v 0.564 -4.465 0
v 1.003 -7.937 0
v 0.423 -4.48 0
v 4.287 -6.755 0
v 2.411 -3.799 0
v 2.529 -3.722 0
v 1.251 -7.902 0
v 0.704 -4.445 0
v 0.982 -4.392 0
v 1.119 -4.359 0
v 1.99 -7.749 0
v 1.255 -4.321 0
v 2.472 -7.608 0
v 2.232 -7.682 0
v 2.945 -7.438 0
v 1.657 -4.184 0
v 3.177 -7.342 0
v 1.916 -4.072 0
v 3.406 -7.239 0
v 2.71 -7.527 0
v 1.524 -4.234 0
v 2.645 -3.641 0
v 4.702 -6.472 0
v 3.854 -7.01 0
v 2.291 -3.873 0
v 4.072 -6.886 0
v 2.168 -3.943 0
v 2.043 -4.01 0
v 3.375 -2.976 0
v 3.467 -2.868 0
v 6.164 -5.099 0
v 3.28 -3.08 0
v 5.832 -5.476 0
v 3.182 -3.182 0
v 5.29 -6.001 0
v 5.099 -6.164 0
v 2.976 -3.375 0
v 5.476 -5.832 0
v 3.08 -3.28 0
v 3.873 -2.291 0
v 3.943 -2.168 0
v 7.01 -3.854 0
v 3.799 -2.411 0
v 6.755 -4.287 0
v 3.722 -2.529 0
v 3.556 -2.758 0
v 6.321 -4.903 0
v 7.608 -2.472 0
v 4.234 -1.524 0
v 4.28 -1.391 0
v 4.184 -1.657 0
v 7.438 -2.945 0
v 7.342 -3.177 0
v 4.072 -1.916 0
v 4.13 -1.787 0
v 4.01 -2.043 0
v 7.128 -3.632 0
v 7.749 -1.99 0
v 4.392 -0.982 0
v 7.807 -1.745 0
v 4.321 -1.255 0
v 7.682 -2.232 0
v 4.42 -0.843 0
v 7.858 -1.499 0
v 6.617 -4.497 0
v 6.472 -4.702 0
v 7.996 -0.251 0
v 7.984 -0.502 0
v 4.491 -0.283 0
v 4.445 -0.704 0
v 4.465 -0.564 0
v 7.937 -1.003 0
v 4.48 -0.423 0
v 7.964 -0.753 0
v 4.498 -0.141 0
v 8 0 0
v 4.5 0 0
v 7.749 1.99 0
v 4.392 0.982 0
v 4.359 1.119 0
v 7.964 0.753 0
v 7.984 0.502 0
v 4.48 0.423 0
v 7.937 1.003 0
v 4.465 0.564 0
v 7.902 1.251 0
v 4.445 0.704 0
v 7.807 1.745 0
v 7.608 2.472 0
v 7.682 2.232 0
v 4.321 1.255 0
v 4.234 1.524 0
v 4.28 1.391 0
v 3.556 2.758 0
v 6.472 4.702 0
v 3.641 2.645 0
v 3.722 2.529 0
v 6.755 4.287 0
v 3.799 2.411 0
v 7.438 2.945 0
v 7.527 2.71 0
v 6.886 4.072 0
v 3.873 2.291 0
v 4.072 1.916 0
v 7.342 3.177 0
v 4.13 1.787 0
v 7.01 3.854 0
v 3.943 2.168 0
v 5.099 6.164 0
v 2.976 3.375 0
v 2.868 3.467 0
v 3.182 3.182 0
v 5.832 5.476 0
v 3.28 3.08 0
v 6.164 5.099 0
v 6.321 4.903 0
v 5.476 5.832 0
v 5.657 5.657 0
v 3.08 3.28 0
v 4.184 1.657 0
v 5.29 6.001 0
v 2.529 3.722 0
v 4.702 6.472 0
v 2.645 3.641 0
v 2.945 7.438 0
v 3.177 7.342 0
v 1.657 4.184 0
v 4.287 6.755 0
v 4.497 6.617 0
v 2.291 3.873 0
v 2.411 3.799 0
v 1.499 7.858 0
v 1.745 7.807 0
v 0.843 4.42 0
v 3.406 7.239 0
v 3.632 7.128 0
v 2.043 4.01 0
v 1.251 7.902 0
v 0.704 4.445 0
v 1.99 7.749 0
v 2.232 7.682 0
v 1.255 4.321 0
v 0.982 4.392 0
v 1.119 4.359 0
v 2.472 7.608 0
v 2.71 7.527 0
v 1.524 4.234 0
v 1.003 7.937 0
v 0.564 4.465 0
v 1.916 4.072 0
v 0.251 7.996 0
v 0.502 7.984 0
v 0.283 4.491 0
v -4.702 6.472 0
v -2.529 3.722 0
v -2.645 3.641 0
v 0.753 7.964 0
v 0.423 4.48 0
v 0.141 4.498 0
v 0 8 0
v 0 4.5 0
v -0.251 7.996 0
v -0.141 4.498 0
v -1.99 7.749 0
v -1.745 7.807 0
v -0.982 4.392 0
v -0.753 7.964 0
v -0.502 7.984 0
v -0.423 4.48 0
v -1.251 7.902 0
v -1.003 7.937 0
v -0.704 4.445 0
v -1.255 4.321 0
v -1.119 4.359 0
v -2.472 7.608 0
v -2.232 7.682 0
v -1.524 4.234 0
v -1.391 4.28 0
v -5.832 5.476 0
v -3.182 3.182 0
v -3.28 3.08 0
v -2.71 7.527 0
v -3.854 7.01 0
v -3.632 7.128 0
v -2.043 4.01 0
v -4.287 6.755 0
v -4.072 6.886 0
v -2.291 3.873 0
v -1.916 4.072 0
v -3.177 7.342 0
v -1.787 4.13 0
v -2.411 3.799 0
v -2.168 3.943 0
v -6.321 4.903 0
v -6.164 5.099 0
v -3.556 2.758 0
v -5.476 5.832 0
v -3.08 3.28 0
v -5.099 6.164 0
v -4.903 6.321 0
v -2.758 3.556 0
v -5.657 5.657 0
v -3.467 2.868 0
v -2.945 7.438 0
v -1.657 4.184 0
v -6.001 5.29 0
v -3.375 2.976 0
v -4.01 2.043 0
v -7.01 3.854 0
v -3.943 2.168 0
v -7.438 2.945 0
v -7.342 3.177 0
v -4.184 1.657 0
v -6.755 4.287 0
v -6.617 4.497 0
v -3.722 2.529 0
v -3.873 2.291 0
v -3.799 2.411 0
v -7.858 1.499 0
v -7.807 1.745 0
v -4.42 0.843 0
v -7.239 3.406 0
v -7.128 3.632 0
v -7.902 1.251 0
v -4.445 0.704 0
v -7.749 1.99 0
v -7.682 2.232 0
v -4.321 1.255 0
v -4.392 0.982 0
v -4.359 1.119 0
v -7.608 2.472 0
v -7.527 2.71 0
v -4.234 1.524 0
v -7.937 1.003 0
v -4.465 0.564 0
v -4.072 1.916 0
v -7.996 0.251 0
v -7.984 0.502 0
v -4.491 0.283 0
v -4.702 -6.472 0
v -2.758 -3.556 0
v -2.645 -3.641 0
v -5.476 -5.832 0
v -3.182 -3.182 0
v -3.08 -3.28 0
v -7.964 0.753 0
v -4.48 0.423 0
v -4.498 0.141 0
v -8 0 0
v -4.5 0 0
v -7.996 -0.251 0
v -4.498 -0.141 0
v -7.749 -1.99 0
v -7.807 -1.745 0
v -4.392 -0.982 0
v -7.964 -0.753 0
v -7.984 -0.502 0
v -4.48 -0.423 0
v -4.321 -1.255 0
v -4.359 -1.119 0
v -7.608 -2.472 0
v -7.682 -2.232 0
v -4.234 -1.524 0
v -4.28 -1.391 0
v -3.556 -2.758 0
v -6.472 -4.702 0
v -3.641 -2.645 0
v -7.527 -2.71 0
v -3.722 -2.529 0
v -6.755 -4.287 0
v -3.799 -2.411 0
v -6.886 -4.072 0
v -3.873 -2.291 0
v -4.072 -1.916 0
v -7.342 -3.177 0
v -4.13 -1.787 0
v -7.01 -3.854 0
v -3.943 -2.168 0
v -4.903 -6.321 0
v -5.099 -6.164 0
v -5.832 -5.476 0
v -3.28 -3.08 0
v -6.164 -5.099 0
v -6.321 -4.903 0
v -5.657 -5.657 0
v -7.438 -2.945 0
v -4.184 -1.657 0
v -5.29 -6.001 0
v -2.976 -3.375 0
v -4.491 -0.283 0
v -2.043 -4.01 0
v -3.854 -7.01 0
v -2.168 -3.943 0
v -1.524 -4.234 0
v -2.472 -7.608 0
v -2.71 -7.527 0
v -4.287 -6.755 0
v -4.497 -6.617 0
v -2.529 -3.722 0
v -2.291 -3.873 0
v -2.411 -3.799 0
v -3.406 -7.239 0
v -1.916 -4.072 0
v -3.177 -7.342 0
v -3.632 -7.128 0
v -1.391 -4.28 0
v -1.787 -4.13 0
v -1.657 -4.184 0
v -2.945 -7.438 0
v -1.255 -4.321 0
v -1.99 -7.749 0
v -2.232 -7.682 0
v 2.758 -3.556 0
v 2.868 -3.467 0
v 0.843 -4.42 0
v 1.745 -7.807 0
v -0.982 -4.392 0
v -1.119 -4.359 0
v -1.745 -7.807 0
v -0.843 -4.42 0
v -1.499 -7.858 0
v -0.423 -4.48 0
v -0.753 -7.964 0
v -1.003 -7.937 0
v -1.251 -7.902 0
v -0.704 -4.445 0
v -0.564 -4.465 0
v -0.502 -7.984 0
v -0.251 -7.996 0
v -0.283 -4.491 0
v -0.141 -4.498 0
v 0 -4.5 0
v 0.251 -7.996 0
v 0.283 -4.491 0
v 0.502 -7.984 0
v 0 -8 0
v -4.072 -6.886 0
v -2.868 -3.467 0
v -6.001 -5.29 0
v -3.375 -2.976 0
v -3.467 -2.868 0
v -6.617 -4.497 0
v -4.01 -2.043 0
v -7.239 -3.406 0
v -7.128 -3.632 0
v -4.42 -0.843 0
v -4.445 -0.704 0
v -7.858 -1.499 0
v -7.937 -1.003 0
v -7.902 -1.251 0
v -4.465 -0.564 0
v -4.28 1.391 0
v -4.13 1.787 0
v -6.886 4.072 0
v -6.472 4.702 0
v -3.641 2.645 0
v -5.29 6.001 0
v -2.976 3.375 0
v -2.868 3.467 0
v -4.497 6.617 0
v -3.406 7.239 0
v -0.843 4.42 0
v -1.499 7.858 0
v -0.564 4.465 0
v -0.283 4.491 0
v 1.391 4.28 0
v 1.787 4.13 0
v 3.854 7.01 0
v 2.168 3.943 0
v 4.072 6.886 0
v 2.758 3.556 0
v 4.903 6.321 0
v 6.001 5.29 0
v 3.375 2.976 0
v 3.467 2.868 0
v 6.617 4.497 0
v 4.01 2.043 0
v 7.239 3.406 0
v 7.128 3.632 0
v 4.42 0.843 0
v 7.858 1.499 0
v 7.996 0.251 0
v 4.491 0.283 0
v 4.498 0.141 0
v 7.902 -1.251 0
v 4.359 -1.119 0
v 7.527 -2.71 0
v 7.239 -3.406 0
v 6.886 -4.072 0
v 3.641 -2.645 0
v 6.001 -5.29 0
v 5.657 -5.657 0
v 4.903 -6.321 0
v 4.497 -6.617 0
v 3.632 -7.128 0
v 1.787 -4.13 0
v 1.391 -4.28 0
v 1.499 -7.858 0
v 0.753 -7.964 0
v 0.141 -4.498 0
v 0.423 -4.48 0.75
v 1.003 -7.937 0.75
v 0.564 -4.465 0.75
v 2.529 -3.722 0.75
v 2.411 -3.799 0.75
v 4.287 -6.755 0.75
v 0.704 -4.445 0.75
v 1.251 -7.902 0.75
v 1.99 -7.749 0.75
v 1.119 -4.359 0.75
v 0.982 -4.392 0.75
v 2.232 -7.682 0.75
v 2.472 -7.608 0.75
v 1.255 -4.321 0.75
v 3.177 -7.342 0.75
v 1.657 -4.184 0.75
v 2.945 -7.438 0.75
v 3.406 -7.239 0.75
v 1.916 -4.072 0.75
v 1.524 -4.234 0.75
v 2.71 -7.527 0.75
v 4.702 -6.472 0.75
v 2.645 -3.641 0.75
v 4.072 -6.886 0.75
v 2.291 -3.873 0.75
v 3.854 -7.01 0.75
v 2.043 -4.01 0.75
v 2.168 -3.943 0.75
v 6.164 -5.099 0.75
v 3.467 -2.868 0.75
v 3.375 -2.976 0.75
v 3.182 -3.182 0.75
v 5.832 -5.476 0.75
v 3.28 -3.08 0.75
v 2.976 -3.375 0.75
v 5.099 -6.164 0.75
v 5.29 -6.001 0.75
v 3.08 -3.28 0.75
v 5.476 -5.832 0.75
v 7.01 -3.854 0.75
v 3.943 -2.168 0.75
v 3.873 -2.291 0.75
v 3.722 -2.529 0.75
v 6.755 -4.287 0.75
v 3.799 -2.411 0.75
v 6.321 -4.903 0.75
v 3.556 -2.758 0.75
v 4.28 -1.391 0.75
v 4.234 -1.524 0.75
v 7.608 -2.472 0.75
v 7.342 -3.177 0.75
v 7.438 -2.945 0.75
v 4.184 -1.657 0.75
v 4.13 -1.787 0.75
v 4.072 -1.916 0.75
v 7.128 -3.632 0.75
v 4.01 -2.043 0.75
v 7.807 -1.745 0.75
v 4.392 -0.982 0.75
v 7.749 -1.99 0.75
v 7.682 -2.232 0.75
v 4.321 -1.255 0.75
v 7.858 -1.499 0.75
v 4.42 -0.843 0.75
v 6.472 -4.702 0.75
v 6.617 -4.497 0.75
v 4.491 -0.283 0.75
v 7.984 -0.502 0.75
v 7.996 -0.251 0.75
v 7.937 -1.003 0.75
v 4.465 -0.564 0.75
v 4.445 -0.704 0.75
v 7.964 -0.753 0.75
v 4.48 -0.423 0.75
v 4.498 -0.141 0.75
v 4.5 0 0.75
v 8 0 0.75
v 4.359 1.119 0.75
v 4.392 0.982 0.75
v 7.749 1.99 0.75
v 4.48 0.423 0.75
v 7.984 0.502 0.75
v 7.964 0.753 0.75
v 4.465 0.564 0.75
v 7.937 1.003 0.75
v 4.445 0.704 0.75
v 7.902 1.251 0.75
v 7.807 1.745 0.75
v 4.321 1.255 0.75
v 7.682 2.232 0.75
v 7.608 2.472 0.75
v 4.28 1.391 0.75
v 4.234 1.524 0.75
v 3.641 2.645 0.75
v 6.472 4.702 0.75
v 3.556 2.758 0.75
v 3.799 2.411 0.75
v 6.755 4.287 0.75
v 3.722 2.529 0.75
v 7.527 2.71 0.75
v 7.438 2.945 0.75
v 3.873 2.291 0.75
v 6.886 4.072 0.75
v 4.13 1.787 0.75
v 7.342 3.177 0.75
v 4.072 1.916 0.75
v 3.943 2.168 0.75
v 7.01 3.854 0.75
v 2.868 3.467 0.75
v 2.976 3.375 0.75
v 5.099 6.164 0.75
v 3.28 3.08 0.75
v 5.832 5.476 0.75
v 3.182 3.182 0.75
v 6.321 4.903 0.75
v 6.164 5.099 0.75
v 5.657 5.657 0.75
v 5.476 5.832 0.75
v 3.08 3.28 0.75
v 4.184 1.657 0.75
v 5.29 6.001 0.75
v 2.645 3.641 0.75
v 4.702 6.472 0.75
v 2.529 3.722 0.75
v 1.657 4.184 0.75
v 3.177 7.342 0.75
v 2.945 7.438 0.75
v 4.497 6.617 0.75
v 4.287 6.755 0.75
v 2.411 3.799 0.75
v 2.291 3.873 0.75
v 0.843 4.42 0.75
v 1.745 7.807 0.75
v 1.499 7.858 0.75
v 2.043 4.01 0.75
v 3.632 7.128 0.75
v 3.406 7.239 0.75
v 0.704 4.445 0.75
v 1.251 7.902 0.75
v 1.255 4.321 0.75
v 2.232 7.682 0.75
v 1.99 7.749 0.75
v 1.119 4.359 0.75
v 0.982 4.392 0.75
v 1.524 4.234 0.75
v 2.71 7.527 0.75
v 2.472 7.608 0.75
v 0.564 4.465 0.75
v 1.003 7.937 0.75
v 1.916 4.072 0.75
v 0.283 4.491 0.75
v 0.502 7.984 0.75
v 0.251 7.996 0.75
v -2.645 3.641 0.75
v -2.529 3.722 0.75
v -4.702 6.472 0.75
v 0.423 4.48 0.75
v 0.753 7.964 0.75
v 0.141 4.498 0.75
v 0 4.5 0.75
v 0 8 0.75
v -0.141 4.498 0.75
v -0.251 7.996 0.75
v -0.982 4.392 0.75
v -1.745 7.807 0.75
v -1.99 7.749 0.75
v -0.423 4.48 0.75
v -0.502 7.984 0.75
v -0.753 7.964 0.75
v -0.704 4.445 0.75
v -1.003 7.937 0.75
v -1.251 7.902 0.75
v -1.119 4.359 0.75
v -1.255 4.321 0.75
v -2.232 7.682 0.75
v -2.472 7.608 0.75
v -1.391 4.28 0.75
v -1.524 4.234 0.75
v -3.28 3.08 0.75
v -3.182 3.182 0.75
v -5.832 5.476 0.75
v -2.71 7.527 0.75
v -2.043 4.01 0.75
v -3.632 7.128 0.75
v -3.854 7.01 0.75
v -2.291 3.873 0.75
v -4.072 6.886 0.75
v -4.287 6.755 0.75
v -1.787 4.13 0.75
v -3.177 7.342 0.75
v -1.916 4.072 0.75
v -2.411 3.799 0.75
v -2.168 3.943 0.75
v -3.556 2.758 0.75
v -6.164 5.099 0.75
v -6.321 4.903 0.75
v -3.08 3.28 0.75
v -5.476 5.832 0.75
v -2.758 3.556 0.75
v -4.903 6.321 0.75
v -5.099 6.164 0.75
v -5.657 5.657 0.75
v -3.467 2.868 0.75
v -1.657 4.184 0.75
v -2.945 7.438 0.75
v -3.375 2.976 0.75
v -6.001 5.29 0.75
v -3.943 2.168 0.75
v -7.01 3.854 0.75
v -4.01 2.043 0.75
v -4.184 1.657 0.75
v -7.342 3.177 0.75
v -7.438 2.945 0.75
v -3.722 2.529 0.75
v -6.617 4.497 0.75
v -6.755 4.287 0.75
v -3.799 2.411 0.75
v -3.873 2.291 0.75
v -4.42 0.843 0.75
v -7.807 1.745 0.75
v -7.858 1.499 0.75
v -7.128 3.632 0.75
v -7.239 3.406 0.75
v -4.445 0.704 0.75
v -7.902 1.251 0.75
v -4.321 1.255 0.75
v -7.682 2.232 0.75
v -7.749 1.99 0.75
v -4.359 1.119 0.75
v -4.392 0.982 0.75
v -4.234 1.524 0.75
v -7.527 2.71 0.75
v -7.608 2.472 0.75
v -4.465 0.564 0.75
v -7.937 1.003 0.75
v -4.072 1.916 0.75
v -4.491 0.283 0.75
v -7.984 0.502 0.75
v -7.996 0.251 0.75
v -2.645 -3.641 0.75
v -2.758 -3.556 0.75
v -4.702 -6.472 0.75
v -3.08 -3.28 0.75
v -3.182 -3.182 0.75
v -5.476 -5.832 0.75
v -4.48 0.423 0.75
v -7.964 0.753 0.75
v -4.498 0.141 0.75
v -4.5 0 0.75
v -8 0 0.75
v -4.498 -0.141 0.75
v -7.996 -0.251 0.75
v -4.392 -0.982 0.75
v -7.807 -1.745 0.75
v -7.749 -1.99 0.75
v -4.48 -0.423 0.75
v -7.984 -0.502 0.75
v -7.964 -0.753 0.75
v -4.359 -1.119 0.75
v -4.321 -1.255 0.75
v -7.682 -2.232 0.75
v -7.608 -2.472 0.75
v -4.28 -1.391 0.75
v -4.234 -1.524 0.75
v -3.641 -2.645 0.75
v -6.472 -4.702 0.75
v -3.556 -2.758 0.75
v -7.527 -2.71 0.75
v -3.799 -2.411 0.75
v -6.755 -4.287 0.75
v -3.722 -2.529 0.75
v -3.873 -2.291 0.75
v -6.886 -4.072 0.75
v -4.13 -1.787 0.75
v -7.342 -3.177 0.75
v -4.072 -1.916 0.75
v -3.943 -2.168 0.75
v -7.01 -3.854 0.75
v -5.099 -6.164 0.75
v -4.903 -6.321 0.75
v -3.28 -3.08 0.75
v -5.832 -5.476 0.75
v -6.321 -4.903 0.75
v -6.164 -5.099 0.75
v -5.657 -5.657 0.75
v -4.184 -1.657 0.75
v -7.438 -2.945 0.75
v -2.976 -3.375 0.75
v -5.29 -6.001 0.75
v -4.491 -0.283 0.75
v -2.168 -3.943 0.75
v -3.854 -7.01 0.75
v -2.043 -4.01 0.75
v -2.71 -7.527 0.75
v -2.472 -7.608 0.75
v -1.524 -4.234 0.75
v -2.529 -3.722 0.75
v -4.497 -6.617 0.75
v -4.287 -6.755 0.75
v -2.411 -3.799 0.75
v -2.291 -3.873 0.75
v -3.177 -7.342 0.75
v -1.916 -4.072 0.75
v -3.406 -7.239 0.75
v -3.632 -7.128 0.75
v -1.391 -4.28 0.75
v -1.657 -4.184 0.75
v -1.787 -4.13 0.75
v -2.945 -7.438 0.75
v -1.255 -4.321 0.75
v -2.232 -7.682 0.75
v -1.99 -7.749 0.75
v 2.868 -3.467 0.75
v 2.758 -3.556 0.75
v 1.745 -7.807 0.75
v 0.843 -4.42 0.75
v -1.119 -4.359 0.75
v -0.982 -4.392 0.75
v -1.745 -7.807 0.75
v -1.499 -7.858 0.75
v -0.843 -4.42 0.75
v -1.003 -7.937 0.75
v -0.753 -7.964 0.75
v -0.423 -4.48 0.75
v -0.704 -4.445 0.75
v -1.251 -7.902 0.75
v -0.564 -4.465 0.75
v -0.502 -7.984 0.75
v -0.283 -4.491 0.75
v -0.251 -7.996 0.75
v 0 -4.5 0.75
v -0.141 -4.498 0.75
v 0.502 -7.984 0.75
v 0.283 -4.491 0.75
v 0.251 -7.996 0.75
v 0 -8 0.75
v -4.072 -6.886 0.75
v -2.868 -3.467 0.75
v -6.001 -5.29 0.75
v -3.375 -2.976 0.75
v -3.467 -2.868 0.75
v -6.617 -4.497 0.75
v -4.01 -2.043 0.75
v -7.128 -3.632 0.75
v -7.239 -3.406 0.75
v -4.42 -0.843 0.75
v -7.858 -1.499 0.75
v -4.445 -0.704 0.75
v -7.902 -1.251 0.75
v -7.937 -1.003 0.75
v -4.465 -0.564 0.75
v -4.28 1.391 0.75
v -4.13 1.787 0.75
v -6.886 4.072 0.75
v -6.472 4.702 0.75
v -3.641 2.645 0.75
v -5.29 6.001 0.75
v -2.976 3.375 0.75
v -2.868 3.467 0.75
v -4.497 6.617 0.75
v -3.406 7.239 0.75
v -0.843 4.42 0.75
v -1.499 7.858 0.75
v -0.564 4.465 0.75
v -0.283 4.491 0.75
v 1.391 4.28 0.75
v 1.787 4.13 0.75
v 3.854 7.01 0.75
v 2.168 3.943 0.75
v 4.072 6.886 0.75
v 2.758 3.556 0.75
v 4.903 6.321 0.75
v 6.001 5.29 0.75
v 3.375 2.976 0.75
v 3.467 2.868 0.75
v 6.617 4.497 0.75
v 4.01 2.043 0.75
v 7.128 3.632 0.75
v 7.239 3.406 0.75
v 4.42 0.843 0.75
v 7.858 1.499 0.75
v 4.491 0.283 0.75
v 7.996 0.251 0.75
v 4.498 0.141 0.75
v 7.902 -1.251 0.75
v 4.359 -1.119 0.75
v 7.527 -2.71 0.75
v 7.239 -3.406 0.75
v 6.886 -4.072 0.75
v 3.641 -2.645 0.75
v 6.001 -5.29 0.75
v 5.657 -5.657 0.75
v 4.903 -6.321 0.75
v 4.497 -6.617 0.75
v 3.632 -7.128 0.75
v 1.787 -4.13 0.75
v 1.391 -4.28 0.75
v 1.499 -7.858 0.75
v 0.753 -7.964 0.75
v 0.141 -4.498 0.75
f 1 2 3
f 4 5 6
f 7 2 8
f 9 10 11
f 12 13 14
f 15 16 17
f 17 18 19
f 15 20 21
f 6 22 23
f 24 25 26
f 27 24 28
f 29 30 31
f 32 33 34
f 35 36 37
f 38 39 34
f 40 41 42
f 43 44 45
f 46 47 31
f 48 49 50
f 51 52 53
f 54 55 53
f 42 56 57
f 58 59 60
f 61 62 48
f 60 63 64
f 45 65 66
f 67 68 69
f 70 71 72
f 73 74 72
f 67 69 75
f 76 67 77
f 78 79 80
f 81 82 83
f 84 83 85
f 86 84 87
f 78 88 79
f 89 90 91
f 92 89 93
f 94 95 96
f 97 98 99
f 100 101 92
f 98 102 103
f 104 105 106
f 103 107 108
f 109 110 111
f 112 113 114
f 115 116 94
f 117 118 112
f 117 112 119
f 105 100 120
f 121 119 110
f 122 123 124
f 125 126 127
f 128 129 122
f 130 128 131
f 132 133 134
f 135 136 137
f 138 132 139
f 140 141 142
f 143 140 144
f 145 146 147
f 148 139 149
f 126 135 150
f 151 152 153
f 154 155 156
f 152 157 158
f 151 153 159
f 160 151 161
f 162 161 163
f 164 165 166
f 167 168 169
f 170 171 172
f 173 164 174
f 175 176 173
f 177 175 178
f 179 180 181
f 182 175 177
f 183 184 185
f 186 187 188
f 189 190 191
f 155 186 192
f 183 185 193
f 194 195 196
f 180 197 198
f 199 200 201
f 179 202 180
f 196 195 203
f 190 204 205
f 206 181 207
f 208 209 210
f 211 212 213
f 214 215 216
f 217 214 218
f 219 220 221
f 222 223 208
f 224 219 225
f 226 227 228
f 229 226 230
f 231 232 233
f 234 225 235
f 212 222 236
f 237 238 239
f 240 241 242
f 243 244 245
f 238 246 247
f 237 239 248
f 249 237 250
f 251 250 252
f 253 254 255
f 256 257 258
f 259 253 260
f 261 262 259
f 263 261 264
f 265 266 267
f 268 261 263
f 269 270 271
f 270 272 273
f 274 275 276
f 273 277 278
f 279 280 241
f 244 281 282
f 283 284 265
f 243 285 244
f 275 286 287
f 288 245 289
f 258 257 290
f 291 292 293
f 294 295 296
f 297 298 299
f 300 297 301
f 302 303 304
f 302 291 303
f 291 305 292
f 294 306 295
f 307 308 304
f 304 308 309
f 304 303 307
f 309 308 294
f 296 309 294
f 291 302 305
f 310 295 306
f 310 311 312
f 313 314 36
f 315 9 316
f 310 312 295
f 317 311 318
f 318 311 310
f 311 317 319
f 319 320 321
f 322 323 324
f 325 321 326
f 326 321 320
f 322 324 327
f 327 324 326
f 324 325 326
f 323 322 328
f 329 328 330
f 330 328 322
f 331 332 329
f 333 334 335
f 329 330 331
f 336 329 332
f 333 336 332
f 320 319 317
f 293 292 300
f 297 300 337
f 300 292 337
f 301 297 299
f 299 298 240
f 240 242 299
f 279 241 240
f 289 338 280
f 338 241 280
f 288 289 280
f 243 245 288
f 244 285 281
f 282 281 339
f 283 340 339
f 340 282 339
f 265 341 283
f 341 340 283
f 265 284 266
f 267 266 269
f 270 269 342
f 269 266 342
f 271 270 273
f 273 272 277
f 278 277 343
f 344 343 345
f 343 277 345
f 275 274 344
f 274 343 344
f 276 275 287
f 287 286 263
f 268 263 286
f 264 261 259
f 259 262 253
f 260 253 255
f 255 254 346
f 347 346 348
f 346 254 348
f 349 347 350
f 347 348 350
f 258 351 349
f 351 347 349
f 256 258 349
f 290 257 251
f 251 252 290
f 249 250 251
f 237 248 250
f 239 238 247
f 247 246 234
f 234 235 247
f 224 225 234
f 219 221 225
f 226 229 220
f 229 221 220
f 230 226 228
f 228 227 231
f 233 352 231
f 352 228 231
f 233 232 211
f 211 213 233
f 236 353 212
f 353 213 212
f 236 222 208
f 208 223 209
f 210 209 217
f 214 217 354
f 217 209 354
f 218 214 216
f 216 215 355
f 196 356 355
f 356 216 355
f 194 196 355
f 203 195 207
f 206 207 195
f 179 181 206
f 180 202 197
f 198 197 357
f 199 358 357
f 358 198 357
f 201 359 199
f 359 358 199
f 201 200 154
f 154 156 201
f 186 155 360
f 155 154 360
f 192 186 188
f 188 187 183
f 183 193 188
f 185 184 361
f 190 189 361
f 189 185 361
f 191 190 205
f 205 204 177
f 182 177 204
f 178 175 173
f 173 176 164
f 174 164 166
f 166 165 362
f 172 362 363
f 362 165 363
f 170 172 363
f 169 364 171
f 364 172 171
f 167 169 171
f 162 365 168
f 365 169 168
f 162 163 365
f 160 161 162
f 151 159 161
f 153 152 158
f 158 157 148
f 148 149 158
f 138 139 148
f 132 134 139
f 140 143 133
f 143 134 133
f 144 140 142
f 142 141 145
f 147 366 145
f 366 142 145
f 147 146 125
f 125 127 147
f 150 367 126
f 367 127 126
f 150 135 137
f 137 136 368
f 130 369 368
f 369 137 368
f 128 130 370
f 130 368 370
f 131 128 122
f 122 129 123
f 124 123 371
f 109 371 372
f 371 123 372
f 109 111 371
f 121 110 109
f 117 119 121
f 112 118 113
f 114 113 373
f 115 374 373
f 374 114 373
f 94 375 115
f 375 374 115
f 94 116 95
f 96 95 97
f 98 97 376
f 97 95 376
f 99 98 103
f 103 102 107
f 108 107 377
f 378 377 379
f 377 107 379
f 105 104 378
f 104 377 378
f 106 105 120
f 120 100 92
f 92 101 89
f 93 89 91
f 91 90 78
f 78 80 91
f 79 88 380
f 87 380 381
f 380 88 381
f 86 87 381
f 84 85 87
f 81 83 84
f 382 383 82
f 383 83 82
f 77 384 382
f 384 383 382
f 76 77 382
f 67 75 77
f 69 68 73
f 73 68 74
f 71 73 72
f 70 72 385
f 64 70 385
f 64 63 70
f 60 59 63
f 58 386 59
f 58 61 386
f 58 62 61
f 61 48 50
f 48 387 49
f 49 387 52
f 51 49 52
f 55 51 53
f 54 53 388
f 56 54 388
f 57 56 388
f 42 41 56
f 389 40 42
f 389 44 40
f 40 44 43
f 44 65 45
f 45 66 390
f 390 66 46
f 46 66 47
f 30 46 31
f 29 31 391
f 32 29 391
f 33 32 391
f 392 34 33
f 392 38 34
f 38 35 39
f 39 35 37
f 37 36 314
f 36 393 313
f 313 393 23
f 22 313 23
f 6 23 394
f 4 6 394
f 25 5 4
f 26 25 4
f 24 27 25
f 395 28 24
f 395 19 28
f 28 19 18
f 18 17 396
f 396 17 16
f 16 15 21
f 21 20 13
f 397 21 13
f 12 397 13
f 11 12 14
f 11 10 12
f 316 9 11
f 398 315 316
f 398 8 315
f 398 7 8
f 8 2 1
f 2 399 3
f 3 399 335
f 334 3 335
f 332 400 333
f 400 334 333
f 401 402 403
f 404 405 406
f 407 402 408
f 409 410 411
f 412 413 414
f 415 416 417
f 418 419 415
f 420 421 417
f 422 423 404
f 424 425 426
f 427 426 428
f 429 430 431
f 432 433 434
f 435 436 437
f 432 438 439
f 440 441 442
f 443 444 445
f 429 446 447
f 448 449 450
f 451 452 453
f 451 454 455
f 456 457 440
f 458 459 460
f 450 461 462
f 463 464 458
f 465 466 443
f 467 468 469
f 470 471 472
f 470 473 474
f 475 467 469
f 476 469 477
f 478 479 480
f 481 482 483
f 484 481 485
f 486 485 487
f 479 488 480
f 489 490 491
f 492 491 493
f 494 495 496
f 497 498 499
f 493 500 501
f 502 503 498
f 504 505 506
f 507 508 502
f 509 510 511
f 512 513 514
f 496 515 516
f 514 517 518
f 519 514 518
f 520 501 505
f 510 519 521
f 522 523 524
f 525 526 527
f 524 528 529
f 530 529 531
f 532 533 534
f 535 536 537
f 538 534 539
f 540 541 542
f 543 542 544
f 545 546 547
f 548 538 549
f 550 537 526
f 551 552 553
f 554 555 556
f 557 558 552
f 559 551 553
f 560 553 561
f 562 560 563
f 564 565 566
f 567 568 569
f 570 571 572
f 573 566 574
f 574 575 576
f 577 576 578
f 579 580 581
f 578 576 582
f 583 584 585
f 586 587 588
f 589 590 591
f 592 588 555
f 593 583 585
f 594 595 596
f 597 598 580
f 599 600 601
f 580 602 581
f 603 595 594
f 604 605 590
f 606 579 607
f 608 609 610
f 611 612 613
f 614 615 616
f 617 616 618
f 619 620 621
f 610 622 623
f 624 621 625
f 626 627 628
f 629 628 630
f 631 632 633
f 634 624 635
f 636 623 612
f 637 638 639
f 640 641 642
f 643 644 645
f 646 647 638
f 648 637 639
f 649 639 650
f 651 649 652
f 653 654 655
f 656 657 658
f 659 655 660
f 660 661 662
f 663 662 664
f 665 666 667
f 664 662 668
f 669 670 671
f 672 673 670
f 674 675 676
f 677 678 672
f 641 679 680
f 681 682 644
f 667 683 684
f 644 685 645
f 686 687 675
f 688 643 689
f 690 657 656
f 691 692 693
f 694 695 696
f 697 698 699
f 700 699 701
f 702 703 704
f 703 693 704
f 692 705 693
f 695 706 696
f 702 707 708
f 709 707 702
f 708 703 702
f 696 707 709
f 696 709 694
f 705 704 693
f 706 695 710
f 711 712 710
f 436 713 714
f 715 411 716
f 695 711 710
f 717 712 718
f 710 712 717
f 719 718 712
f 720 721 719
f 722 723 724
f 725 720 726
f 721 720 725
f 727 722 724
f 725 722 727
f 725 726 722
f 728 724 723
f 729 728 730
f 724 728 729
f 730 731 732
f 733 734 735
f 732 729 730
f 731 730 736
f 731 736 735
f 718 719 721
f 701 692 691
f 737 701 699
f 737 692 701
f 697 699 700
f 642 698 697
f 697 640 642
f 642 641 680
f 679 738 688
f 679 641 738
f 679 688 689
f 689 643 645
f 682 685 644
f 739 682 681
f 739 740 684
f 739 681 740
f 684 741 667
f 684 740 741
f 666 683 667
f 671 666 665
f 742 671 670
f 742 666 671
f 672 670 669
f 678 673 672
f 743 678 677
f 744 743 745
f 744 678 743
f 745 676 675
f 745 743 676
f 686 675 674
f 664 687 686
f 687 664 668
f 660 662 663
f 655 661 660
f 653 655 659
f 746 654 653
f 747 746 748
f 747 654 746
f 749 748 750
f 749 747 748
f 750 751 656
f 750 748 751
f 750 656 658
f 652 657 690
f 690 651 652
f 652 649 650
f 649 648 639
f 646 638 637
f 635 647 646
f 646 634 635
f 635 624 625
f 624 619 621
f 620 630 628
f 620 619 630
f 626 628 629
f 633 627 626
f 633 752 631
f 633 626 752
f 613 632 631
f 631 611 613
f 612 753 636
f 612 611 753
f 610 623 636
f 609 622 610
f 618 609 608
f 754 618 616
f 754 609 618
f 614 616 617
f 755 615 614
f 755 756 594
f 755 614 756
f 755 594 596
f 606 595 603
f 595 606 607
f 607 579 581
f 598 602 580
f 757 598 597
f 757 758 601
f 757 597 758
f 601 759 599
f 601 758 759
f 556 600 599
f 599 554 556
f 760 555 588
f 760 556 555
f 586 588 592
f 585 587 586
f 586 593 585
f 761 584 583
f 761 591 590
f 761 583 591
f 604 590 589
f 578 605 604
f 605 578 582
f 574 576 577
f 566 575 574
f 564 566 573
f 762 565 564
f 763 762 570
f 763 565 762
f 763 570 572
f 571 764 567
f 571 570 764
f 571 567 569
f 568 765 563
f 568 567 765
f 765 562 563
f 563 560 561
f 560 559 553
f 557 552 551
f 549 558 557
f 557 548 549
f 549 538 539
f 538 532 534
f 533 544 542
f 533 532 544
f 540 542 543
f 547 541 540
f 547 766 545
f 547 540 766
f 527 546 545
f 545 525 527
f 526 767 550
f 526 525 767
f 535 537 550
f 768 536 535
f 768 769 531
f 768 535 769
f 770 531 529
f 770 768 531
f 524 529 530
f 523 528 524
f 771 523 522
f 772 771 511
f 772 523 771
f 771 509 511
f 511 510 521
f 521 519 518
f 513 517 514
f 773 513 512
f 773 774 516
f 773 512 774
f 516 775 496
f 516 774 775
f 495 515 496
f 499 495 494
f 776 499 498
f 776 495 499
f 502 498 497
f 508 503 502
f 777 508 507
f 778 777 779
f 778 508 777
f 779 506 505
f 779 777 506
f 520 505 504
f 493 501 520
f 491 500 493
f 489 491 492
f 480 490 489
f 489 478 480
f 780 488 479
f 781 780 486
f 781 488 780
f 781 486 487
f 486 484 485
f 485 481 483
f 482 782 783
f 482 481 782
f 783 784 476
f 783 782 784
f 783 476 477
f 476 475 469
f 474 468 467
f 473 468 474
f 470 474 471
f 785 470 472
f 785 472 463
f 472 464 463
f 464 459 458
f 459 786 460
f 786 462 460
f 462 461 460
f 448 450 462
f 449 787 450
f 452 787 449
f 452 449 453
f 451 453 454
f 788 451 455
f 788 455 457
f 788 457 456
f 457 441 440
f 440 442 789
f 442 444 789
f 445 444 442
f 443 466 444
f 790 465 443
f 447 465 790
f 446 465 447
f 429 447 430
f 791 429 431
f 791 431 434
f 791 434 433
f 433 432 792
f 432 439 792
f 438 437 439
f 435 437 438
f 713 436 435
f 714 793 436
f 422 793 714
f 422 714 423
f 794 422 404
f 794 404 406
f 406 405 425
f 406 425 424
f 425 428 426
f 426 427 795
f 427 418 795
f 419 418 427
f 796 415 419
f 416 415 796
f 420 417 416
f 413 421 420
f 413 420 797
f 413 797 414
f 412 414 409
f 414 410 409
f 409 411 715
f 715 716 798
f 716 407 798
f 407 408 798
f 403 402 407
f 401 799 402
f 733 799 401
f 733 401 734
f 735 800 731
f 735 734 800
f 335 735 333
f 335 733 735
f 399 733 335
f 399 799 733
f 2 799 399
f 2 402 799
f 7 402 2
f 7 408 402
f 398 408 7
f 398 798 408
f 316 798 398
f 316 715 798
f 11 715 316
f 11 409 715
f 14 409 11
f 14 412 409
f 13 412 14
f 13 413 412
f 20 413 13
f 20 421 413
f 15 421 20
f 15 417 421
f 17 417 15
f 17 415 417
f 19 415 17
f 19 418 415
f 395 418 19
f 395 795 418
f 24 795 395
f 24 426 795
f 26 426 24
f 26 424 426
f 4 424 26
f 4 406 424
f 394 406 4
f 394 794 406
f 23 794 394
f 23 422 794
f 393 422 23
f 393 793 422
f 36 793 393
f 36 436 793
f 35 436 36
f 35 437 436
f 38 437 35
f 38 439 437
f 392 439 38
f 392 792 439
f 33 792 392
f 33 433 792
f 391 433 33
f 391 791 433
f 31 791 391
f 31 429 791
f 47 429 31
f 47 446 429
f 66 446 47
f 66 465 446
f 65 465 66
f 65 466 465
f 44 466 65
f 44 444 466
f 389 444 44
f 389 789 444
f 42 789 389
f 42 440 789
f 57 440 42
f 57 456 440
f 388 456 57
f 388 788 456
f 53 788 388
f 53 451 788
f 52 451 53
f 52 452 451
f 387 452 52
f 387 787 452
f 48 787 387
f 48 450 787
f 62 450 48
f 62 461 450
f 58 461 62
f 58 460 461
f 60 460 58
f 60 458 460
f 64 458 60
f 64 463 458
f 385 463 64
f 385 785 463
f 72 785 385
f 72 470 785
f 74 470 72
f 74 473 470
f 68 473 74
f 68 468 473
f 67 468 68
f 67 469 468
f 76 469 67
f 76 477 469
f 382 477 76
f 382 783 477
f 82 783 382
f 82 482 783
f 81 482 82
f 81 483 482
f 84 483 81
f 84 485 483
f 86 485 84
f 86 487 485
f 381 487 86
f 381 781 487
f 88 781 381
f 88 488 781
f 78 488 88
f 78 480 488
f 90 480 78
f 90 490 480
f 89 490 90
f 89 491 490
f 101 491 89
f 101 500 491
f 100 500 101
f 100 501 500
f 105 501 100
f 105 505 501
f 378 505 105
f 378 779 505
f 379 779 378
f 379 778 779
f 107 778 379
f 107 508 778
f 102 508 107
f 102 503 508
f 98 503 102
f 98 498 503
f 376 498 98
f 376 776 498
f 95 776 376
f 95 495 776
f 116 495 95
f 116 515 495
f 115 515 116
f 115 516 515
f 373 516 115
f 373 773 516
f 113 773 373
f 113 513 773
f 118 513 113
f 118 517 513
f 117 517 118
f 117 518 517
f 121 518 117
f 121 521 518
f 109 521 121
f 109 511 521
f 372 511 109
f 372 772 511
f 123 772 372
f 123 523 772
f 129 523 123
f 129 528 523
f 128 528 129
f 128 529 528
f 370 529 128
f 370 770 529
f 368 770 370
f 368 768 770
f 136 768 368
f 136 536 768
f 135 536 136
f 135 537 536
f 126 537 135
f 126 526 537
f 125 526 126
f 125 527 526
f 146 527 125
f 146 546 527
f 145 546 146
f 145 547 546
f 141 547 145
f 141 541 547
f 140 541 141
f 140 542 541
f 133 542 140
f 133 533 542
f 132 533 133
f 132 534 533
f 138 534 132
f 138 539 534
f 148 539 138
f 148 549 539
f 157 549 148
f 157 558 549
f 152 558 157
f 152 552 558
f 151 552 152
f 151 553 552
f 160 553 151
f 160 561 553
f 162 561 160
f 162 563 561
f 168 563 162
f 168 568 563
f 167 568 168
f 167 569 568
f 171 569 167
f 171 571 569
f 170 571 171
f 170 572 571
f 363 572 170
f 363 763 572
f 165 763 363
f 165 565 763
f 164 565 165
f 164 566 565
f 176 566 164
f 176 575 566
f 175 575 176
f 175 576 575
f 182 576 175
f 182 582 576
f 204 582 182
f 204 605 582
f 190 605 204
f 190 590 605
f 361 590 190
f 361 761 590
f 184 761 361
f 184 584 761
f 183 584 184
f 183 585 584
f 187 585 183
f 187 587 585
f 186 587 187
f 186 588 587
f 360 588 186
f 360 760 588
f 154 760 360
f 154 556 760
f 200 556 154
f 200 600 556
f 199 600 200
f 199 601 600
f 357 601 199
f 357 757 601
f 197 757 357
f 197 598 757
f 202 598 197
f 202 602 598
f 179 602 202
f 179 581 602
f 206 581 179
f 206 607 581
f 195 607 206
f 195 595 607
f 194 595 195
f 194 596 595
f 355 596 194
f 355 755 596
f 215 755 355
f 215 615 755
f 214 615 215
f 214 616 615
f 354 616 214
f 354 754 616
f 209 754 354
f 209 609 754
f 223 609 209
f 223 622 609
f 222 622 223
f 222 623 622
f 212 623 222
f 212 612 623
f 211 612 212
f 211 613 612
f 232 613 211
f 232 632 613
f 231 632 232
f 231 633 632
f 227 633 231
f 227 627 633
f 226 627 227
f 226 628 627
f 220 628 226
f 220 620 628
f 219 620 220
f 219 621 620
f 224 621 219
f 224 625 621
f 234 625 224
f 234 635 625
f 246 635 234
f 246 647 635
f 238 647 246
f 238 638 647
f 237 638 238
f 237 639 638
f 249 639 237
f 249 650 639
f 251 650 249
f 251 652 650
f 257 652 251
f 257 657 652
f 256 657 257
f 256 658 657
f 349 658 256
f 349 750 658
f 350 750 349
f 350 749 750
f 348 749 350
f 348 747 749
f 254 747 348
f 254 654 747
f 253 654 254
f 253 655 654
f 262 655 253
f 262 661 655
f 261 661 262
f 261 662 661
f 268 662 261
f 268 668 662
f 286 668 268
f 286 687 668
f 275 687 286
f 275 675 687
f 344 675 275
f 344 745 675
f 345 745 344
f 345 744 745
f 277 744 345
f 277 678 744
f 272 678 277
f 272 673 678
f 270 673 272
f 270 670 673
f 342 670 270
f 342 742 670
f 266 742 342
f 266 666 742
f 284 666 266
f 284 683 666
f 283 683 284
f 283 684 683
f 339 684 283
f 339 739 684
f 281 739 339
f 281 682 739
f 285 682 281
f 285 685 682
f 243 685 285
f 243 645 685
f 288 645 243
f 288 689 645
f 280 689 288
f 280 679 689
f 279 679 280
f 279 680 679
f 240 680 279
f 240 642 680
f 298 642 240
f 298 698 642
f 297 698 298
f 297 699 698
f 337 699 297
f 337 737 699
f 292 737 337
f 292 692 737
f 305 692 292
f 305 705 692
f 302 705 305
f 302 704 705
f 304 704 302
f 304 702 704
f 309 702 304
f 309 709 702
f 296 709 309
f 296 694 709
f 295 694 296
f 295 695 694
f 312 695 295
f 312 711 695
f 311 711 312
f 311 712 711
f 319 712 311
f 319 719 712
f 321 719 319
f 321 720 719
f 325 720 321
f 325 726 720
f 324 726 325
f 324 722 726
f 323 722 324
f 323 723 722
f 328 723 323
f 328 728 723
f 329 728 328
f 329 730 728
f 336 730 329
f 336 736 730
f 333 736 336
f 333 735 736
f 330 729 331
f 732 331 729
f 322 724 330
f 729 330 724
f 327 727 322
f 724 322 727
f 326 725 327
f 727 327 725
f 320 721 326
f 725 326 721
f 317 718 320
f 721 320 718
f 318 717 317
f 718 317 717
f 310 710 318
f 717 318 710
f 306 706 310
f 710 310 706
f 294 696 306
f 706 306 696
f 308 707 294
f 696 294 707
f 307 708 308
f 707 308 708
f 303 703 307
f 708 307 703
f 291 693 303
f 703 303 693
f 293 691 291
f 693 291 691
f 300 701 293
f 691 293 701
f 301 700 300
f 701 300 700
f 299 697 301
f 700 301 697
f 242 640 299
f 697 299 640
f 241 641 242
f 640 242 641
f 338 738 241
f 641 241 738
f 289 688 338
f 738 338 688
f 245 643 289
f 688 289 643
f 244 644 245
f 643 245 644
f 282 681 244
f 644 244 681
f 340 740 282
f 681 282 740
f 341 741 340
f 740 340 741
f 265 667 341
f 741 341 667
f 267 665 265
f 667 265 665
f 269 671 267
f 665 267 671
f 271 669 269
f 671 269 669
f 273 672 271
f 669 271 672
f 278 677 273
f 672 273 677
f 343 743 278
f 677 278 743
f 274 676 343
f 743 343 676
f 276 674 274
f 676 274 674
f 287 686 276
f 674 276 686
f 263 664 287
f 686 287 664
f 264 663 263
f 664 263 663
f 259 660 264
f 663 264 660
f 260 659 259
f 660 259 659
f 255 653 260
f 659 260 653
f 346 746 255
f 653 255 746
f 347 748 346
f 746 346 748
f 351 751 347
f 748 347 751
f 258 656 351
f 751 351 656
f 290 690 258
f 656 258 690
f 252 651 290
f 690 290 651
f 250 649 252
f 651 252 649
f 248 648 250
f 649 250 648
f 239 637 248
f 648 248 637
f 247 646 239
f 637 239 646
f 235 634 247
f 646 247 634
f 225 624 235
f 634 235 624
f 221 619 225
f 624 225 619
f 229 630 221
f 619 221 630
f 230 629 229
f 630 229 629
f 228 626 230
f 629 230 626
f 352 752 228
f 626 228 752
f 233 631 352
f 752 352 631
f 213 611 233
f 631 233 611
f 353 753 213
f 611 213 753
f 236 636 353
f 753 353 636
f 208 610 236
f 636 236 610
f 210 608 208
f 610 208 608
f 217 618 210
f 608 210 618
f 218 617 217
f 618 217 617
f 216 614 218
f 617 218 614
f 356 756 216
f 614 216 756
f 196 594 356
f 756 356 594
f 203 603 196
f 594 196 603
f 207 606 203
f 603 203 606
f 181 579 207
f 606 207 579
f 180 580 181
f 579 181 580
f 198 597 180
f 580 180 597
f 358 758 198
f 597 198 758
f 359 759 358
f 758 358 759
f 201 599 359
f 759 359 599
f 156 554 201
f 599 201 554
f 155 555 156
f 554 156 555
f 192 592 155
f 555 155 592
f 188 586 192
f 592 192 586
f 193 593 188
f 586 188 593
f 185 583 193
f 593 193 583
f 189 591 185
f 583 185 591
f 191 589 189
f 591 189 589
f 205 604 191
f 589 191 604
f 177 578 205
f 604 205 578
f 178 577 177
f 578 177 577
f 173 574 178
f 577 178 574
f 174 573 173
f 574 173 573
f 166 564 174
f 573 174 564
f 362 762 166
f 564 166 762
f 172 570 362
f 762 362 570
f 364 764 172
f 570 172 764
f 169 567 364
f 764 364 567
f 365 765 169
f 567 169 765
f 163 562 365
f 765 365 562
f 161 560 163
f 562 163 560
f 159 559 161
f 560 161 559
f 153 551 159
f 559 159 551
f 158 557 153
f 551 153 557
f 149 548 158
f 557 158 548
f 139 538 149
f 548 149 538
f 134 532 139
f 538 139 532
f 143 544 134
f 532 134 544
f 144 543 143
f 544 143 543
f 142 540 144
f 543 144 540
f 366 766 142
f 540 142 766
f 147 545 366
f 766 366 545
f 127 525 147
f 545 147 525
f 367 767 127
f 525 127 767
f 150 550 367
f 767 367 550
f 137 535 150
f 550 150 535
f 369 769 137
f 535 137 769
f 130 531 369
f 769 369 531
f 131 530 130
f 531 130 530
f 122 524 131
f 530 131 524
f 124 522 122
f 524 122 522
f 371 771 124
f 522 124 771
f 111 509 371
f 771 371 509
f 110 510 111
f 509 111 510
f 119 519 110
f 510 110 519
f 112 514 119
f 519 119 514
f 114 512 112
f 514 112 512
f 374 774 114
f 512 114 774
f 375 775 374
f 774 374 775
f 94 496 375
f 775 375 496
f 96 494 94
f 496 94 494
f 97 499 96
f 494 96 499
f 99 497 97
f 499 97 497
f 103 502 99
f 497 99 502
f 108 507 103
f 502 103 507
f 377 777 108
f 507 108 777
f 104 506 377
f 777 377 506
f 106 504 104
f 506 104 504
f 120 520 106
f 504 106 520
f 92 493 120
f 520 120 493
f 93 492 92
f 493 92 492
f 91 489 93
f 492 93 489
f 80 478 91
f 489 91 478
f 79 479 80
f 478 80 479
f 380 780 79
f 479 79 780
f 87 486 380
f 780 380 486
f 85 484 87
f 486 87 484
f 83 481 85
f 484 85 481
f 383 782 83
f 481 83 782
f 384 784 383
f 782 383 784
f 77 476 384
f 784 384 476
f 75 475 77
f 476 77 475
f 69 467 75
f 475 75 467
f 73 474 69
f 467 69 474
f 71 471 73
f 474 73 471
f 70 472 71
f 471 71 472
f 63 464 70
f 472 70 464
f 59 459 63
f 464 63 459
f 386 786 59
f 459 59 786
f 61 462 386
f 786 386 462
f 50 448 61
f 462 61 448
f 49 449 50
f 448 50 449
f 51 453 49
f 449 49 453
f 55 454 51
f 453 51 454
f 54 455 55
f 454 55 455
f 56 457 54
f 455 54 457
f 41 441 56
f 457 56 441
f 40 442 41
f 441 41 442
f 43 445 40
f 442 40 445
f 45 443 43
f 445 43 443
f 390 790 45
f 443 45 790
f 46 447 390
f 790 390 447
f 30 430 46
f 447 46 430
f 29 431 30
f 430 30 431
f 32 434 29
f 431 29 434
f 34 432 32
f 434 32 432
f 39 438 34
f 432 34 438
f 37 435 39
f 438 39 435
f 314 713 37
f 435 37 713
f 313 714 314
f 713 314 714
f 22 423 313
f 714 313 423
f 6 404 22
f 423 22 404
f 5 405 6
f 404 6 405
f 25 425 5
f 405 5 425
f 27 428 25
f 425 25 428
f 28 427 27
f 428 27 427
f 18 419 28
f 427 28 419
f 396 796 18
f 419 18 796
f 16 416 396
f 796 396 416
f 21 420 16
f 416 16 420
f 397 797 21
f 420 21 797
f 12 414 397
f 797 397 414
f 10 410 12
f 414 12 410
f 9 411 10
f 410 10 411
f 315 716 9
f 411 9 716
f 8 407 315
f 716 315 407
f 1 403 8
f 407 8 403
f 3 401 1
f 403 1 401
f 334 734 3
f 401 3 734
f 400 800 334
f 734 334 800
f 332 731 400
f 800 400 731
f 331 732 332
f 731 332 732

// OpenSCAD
$fn=200;
linear_extrude(0.75) {
  difference() {
    circle(d=16);
    circle(d=9.0);
  }
}
